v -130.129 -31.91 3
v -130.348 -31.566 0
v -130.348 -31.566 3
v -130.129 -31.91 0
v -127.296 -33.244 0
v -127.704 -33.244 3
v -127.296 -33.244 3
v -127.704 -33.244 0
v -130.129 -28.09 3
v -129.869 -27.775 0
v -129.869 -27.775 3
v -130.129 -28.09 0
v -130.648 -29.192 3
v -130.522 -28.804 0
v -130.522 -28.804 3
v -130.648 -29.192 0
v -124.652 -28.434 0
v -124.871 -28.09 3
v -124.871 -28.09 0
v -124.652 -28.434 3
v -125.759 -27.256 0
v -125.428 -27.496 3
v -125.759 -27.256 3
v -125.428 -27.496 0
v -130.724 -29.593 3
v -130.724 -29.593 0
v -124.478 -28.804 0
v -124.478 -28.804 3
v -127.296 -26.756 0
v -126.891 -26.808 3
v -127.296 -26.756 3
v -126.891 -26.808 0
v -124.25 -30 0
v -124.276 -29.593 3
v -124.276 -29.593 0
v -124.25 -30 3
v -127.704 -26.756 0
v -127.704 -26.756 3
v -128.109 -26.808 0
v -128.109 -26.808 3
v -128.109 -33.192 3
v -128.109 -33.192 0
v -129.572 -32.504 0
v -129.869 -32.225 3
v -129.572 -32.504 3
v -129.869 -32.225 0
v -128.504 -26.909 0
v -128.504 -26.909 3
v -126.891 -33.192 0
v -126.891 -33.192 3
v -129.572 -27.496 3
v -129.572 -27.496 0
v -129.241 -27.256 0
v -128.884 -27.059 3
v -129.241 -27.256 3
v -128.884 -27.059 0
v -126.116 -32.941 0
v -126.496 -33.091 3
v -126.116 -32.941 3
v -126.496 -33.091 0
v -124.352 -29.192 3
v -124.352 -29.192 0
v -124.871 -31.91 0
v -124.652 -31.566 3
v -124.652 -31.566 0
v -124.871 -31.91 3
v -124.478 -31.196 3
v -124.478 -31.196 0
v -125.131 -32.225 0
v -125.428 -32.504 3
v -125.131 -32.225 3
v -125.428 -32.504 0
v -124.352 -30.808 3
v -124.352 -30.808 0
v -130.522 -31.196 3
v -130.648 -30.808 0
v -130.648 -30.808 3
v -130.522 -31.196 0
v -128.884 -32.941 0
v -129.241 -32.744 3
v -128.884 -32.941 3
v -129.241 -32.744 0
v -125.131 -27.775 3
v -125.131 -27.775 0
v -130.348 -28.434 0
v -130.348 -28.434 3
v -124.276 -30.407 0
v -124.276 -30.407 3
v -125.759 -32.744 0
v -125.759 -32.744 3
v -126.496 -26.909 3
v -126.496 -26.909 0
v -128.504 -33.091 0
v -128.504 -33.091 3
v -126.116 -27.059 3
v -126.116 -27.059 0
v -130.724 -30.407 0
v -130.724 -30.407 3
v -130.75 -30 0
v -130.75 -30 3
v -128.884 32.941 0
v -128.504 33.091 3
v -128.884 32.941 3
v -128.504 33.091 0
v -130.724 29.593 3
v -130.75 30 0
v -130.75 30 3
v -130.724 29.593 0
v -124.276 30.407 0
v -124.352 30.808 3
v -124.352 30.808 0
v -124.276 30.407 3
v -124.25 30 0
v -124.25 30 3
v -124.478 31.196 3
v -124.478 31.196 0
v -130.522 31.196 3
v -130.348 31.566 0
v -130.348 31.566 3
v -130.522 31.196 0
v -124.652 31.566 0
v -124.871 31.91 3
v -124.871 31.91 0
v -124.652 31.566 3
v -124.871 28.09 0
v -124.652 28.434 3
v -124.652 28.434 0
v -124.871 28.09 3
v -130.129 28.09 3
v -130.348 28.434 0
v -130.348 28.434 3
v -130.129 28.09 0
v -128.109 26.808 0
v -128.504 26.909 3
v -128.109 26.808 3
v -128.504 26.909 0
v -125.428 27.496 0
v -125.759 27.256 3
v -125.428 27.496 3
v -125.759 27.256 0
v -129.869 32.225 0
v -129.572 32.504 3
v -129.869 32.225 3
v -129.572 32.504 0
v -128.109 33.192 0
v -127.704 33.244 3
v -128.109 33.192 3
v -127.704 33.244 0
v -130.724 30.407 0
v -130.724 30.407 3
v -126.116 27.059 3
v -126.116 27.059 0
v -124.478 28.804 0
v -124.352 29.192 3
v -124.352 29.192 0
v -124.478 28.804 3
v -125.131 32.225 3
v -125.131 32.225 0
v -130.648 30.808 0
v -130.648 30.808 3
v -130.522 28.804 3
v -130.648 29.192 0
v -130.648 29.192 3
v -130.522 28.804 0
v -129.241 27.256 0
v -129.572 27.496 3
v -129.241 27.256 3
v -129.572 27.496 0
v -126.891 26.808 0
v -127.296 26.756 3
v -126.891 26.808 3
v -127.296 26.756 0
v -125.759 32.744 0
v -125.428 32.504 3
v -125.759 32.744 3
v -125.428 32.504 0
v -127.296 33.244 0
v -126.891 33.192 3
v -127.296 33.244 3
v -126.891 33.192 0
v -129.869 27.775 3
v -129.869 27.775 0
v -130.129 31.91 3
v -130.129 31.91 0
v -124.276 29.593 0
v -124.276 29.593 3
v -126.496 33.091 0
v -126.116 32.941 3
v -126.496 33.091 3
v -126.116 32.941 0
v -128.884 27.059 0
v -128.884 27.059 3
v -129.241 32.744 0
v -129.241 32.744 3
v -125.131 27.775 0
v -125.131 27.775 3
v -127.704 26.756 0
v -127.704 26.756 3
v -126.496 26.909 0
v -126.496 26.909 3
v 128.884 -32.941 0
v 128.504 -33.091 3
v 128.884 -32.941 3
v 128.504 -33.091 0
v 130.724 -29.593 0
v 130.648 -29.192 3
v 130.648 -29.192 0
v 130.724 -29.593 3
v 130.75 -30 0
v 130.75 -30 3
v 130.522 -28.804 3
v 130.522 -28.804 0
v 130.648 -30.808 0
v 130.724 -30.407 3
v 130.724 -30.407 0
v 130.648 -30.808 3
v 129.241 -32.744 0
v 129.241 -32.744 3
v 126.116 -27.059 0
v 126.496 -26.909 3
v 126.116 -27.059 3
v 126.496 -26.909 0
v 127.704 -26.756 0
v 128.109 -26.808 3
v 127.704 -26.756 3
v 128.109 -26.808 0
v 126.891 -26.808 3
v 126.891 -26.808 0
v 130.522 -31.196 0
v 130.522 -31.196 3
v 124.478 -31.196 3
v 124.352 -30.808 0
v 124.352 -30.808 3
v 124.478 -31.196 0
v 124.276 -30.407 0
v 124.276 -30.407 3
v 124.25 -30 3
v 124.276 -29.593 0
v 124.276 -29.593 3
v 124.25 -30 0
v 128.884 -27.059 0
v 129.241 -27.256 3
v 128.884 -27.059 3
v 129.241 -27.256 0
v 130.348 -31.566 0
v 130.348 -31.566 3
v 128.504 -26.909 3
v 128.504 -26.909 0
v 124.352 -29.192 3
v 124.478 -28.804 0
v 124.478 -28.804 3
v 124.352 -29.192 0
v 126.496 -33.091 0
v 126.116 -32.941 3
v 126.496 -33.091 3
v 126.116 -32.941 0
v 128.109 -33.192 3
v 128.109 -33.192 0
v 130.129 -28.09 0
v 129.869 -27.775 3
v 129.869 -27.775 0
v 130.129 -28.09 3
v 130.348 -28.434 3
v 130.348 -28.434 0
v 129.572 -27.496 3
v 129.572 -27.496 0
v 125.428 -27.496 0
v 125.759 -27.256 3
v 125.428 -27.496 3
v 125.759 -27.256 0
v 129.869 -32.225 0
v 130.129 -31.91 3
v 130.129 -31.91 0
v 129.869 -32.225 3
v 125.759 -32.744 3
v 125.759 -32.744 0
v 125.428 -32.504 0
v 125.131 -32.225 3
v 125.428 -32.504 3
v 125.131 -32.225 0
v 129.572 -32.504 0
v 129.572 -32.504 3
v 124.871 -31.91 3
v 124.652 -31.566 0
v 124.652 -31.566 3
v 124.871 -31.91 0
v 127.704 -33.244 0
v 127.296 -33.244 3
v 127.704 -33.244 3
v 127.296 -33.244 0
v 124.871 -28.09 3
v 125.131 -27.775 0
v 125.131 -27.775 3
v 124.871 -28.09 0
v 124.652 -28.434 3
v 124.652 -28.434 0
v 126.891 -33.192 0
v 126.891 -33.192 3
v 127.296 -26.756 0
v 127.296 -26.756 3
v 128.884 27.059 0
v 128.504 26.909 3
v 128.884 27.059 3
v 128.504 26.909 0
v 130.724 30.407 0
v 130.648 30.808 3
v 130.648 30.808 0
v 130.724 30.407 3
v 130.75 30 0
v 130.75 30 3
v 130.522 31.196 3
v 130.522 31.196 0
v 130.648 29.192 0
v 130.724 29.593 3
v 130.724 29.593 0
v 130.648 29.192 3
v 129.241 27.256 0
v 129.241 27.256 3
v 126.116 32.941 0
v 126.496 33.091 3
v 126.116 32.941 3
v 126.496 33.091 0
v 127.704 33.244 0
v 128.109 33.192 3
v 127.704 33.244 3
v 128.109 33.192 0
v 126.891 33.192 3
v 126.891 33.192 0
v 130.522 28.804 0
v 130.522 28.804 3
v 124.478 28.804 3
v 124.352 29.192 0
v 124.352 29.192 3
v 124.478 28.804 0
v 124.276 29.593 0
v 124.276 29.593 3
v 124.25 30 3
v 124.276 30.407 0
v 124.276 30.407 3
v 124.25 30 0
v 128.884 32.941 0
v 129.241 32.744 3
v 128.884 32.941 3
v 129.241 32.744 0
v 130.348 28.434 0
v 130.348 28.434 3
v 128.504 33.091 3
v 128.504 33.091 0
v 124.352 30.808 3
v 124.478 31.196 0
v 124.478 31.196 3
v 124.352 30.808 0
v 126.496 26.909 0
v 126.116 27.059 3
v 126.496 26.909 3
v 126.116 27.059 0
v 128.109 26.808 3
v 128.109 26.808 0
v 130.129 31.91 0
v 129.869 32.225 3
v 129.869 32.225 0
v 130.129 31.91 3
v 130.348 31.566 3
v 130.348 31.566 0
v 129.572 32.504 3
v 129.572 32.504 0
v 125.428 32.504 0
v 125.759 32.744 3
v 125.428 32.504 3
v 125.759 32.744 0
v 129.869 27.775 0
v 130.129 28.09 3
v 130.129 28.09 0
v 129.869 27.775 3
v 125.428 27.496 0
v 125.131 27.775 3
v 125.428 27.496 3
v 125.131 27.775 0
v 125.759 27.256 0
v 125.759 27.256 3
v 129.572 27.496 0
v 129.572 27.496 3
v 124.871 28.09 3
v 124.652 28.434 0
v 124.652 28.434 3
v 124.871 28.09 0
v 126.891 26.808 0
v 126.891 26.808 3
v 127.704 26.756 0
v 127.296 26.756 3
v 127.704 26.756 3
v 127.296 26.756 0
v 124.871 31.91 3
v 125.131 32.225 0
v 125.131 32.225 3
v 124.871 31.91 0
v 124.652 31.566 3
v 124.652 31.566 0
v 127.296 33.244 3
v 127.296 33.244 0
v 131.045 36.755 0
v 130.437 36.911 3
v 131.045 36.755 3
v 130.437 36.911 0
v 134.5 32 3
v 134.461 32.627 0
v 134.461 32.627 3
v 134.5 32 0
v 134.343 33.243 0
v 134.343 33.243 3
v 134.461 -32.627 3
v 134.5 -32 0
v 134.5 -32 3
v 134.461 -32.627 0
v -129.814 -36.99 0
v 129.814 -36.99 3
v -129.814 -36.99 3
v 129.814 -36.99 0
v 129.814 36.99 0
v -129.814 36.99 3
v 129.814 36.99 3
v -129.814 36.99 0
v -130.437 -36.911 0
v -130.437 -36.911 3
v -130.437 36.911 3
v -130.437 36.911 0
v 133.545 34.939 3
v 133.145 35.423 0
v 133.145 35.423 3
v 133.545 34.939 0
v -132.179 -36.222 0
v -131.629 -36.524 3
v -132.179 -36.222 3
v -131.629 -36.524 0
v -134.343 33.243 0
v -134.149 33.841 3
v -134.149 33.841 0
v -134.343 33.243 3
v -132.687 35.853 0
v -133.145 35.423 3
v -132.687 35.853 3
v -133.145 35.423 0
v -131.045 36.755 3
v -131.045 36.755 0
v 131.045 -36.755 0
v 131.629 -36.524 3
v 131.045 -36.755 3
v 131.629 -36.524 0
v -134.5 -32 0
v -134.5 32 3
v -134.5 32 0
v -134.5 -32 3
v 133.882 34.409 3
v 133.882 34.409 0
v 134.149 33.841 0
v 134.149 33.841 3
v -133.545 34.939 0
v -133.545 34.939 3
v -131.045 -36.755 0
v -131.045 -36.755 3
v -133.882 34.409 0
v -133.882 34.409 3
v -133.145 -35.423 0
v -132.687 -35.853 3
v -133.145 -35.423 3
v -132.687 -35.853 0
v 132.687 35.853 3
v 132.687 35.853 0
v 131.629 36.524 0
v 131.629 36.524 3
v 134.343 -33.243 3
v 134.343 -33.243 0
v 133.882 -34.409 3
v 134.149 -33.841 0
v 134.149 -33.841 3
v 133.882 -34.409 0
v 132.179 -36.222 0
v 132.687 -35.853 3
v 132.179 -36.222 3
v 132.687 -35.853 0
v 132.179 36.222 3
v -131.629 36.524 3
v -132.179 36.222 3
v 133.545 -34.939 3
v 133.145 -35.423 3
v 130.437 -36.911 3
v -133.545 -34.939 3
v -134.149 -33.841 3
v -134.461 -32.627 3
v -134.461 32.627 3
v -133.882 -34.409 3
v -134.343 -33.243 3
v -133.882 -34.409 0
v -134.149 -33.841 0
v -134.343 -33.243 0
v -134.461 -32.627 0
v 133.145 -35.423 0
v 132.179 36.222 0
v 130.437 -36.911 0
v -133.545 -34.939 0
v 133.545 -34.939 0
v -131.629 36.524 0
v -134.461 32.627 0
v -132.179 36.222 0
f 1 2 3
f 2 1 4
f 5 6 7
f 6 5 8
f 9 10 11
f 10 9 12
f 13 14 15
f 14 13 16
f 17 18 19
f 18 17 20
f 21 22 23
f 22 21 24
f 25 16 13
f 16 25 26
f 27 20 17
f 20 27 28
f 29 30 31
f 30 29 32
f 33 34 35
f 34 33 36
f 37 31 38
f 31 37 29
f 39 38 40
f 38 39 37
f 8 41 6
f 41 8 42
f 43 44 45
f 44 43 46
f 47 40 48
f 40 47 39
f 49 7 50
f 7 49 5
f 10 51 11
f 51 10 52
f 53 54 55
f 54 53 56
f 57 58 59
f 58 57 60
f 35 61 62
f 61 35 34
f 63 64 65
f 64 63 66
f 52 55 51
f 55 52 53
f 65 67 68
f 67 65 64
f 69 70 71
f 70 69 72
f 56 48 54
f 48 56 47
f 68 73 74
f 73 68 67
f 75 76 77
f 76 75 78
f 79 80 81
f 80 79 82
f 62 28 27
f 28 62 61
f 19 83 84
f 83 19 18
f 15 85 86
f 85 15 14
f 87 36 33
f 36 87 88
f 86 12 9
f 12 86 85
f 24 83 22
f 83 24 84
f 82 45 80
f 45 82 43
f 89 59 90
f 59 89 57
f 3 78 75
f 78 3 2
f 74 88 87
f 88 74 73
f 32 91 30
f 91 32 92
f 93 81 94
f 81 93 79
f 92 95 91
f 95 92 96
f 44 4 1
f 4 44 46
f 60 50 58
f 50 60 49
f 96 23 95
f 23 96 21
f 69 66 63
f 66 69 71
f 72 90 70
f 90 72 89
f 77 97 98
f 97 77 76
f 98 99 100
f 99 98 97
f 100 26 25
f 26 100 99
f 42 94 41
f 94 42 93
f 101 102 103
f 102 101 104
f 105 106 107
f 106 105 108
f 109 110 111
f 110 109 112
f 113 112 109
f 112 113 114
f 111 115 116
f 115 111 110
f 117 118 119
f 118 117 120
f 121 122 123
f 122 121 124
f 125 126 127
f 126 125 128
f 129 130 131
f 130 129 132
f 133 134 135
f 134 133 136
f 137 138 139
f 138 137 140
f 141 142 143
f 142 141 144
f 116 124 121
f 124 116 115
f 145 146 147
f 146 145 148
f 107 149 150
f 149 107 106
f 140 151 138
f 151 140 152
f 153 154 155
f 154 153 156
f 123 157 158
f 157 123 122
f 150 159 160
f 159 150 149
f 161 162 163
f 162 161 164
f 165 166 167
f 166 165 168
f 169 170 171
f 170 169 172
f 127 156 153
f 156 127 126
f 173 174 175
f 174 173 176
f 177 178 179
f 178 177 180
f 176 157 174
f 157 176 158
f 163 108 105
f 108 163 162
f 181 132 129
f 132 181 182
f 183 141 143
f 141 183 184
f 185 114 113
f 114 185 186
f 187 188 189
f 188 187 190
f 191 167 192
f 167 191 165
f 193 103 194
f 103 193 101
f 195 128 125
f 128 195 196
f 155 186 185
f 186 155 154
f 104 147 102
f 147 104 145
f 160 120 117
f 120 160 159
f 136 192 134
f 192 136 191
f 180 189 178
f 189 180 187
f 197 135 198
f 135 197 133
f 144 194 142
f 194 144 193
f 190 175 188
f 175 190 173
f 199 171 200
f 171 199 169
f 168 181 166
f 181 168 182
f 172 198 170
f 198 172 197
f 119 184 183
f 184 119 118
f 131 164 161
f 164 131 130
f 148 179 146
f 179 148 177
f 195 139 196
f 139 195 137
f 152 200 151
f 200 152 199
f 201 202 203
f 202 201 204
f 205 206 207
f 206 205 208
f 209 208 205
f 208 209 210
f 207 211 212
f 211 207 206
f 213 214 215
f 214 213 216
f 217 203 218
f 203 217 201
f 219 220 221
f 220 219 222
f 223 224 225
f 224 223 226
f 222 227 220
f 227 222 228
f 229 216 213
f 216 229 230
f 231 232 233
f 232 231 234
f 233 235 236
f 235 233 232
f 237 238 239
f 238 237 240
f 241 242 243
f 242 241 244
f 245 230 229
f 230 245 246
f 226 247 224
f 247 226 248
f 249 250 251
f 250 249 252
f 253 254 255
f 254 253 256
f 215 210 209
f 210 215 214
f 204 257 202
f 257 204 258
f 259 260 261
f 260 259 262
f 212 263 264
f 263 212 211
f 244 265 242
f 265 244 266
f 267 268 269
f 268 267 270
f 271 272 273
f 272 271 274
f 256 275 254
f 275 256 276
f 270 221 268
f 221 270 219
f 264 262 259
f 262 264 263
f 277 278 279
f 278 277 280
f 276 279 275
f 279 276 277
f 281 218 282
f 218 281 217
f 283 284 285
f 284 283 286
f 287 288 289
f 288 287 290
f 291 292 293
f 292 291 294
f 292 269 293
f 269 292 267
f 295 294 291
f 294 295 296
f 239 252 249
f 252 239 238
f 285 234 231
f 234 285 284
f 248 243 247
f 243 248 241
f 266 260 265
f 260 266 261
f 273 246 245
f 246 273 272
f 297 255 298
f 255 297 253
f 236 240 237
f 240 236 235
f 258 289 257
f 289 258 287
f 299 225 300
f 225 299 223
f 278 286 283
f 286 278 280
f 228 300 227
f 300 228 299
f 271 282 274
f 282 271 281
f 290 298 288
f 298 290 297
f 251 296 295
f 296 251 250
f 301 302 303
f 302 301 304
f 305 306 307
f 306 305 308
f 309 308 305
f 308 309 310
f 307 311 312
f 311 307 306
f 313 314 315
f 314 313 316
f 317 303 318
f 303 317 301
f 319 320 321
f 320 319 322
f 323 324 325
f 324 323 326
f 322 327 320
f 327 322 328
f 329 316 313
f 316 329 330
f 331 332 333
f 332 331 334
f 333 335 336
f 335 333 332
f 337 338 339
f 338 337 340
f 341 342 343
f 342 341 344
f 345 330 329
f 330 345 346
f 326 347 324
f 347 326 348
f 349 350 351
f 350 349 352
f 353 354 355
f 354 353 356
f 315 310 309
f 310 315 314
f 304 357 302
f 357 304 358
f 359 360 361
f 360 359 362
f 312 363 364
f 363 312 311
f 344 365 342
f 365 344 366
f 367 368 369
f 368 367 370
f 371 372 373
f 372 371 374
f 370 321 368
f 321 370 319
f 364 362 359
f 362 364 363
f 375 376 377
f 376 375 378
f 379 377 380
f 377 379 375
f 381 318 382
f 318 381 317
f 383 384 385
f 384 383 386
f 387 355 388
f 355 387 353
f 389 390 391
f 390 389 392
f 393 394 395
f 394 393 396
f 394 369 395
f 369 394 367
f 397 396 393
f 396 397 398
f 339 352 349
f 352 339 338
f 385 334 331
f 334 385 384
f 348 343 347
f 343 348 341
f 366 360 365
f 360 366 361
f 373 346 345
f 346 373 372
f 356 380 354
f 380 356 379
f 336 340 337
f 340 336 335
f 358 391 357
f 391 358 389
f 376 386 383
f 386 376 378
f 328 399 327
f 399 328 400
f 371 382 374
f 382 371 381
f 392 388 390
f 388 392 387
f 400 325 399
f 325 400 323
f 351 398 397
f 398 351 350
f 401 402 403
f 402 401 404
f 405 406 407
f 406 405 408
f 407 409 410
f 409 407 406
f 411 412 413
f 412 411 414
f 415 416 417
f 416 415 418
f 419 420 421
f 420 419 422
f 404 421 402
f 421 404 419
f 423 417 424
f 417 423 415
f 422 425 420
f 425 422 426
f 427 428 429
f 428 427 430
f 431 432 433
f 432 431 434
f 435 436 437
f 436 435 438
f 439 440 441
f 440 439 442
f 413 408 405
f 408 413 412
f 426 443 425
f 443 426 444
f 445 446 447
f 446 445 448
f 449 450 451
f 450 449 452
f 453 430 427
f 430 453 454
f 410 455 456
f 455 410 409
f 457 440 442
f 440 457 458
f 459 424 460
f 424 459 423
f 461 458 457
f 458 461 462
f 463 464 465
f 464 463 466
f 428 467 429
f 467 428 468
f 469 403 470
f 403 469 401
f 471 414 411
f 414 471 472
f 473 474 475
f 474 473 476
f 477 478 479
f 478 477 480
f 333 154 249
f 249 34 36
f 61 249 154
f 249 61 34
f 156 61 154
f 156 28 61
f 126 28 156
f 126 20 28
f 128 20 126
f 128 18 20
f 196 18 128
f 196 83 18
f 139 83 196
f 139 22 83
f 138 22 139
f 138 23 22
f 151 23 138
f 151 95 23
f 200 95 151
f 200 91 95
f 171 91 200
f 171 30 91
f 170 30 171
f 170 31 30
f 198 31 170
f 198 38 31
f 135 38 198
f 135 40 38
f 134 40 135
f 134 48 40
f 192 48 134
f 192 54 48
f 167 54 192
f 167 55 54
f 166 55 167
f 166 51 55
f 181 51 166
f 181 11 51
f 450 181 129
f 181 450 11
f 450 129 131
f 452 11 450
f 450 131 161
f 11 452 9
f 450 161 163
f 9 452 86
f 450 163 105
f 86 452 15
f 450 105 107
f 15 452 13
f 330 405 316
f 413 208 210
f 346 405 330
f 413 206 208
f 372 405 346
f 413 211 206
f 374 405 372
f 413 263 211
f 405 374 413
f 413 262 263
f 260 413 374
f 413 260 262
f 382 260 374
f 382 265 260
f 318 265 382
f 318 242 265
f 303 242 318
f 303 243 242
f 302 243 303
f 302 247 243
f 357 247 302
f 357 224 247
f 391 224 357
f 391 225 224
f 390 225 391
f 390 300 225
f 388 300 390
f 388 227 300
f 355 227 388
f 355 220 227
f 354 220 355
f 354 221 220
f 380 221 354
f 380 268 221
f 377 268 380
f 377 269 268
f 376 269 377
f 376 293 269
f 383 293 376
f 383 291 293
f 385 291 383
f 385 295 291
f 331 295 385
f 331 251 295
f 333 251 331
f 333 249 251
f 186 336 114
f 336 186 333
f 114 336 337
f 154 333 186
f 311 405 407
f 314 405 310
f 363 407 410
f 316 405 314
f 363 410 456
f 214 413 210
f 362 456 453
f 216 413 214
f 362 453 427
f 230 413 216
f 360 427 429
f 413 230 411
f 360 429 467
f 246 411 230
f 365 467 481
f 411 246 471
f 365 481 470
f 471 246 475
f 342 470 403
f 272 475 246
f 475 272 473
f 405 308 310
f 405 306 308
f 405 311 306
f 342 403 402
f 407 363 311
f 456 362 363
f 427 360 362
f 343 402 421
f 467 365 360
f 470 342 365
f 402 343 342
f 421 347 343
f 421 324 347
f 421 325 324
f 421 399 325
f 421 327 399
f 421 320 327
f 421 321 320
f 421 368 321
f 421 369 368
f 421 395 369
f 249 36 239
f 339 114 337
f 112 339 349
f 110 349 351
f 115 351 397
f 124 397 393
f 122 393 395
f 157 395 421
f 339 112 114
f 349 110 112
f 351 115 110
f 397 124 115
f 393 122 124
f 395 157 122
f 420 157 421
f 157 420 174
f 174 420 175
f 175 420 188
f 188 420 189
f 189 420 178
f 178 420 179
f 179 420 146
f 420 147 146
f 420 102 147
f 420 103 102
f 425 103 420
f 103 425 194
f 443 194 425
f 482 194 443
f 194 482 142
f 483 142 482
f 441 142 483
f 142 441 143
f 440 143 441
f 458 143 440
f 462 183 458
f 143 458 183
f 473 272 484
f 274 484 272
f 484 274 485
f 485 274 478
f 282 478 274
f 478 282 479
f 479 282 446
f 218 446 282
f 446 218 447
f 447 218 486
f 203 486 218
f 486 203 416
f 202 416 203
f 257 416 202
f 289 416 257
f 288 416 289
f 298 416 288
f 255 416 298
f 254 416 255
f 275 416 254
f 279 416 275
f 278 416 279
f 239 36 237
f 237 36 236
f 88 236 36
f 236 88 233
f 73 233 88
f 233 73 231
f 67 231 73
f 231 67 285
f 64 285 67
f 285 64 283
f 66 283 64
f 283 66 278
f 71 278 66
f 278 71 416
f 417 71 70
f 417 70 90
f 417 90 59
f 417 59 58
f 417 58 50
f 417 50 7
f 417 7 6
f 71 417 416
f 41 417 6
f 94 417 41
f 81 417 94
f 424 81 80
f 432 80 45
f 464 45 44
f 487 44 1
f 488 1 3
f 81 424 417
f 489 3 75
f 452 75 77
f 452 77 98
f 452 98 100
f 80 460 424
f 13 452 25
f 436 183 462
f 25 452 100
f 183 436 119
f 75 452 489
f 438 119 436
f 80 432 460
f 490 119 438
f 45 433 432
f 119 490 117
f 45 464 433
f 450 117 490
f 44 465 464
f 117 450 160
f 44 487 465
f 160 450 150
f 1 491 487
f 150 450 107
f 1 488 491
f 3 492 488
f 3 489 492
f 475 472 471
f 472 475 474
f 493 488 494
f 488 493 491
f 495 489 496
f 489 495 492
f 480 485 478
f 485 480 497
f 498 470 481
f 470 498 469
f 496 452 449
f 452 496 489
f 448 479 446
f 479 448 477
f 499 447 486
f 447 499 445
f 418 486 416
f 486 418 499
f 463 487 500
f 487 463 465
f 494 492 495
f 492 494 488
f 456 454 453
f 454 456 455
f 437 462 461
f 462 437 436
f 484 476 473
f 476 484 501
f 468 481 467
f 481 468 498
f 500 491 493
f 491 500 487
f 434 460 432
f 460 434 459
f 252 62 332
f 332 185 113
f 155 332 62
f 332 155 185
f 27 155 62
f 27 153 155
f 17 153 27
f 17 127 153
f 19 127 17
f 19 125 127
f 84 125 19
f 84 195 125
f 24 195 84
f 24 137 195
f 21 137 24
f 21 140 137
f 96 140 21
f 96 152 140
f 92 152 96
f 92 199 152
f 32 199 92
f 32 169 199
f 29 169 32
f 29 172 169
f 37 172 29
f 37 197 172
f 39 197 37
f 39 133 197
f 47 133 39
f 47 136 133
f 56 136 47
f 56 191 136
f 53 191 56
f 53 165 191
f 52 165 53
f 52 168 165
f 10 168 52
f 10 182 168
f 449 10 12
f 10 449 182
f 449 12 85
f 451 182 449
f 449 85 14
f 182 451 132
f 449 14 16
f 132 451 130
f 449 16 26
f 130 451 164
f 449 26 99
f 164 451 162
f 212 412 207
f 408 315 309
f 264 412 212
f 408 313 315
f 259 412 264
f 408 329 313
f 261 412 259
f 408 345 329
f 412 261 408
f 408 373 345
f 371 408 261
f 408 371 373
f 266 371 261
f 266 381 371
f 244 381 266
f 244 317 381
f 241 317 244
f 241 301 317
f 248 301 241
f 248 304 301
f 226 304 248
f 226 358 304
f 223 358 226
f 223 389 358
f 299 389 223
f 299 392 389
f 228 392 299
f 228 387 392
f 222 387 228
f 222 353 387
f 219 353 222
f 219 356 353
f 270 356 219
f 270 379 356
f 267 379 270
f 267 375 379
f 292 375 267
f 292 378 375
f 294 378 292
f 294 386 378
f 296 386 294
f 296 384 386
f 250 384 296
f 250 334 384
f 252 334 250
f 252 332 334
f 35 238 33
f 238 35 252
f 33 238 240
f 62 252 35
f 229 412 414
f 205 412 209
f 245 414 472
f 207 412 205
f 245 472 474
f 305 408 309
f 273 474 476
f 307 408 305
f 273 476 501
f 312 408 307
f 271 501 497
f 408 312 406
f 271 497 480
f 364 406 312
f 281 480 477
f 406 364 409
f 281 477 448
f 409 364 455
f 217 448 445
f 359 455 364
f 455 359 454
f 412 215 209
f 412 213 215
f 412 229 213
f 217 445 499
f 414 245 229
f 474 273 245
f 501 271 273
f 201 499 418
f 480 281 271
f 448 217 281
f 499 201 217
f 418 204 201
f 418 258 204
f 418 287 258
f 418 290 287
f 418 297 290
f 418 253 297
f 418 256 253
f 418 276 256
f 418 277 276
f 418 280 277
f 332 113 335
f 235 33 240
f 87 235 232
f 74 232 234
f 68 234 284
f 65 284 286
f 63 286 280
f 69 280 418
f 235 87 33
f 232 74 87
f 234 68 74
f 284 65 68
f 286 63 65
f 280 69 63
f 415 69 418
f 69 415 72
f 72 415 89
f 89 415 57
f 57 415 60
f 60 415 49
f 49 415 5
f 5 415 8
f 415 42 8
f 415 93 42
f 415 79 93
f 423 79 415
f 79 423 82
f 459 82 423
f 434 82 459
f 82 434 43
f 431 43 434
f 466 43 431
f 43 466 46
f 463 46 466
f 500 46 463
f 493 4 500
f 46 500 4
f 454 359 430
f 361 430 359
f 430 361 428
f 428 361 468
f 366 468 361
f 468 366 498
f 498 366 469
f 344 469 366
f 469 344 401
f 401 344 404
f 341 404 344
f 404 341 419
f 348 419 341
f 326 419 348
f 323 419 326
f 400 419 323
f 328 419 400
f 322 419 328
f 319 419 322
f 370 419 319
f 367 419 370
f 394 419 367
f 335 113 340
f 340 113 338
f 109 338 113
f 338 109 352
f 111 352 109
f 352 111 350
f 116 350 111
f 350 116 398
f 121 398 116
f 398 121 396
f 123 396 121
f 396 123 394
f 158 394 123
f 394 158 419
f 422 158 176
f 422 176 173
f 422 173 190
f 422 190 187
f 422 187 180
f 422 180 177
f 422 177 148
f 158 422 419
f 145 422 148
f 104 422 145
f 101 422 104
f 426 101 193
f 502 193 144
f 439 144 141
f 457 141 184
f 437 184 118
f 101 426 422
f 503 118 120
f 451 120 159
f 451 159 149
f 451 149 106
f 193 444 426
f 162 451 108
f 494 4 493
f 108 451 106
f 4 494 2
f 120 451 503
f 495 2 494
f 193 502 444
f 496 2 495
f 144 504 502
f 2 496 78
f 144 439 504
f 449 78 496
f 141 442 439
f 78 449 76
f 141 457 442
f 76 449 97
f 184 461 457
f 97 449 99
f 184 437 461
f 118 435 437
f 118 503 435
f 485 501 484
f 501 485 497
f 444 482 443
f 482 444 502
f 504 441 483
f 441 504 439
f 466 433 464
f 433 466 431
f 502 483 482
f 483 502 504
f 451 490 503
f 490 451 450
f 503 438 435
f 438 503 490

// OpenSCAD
$fn = 50;


difference() {
	union() {
		hull() {
			translate(v = [-129.5000000000, 32.0000000000, 0]) {
				cylinder(h = 3, r = 5);
			}
			translate(v = [129.5000000000, 32.0000000000, 0]) {
				cylinder(h = 3, r = 5);
			}
			translate(v = [-129.5000000000, -32.0000000000, 0]) {
				cylinder(h = 3, r = 5);
			}
			translate(v = [129.5000000000, -32.0000000000, 0]) {
				cylinder(h = 3, r = 5);
			}
		}
	}
	union() {
		translate(v = [-127.5000000000, -30.0000000000, -100.0000000000]) {
			cylinder(h = 200, r = 3.2500000000);
		}
		translate(v = [-127.5000000000, 30.0000000000, -100.0000000000]) {
			cylinder(h = 200, r = 3.2500000000);
		}
		translate(v = [127.5000000000, -30.0000000000, -100.0000000000]) {
			cylinder(h = 200, r = 3.2500000000);
		}
		translate(v = [127.5000000000, 30.0000000000, -100.0000000000]) {
			cylinder(h = 200, r = 3.2500000000);
		}
	}
}
